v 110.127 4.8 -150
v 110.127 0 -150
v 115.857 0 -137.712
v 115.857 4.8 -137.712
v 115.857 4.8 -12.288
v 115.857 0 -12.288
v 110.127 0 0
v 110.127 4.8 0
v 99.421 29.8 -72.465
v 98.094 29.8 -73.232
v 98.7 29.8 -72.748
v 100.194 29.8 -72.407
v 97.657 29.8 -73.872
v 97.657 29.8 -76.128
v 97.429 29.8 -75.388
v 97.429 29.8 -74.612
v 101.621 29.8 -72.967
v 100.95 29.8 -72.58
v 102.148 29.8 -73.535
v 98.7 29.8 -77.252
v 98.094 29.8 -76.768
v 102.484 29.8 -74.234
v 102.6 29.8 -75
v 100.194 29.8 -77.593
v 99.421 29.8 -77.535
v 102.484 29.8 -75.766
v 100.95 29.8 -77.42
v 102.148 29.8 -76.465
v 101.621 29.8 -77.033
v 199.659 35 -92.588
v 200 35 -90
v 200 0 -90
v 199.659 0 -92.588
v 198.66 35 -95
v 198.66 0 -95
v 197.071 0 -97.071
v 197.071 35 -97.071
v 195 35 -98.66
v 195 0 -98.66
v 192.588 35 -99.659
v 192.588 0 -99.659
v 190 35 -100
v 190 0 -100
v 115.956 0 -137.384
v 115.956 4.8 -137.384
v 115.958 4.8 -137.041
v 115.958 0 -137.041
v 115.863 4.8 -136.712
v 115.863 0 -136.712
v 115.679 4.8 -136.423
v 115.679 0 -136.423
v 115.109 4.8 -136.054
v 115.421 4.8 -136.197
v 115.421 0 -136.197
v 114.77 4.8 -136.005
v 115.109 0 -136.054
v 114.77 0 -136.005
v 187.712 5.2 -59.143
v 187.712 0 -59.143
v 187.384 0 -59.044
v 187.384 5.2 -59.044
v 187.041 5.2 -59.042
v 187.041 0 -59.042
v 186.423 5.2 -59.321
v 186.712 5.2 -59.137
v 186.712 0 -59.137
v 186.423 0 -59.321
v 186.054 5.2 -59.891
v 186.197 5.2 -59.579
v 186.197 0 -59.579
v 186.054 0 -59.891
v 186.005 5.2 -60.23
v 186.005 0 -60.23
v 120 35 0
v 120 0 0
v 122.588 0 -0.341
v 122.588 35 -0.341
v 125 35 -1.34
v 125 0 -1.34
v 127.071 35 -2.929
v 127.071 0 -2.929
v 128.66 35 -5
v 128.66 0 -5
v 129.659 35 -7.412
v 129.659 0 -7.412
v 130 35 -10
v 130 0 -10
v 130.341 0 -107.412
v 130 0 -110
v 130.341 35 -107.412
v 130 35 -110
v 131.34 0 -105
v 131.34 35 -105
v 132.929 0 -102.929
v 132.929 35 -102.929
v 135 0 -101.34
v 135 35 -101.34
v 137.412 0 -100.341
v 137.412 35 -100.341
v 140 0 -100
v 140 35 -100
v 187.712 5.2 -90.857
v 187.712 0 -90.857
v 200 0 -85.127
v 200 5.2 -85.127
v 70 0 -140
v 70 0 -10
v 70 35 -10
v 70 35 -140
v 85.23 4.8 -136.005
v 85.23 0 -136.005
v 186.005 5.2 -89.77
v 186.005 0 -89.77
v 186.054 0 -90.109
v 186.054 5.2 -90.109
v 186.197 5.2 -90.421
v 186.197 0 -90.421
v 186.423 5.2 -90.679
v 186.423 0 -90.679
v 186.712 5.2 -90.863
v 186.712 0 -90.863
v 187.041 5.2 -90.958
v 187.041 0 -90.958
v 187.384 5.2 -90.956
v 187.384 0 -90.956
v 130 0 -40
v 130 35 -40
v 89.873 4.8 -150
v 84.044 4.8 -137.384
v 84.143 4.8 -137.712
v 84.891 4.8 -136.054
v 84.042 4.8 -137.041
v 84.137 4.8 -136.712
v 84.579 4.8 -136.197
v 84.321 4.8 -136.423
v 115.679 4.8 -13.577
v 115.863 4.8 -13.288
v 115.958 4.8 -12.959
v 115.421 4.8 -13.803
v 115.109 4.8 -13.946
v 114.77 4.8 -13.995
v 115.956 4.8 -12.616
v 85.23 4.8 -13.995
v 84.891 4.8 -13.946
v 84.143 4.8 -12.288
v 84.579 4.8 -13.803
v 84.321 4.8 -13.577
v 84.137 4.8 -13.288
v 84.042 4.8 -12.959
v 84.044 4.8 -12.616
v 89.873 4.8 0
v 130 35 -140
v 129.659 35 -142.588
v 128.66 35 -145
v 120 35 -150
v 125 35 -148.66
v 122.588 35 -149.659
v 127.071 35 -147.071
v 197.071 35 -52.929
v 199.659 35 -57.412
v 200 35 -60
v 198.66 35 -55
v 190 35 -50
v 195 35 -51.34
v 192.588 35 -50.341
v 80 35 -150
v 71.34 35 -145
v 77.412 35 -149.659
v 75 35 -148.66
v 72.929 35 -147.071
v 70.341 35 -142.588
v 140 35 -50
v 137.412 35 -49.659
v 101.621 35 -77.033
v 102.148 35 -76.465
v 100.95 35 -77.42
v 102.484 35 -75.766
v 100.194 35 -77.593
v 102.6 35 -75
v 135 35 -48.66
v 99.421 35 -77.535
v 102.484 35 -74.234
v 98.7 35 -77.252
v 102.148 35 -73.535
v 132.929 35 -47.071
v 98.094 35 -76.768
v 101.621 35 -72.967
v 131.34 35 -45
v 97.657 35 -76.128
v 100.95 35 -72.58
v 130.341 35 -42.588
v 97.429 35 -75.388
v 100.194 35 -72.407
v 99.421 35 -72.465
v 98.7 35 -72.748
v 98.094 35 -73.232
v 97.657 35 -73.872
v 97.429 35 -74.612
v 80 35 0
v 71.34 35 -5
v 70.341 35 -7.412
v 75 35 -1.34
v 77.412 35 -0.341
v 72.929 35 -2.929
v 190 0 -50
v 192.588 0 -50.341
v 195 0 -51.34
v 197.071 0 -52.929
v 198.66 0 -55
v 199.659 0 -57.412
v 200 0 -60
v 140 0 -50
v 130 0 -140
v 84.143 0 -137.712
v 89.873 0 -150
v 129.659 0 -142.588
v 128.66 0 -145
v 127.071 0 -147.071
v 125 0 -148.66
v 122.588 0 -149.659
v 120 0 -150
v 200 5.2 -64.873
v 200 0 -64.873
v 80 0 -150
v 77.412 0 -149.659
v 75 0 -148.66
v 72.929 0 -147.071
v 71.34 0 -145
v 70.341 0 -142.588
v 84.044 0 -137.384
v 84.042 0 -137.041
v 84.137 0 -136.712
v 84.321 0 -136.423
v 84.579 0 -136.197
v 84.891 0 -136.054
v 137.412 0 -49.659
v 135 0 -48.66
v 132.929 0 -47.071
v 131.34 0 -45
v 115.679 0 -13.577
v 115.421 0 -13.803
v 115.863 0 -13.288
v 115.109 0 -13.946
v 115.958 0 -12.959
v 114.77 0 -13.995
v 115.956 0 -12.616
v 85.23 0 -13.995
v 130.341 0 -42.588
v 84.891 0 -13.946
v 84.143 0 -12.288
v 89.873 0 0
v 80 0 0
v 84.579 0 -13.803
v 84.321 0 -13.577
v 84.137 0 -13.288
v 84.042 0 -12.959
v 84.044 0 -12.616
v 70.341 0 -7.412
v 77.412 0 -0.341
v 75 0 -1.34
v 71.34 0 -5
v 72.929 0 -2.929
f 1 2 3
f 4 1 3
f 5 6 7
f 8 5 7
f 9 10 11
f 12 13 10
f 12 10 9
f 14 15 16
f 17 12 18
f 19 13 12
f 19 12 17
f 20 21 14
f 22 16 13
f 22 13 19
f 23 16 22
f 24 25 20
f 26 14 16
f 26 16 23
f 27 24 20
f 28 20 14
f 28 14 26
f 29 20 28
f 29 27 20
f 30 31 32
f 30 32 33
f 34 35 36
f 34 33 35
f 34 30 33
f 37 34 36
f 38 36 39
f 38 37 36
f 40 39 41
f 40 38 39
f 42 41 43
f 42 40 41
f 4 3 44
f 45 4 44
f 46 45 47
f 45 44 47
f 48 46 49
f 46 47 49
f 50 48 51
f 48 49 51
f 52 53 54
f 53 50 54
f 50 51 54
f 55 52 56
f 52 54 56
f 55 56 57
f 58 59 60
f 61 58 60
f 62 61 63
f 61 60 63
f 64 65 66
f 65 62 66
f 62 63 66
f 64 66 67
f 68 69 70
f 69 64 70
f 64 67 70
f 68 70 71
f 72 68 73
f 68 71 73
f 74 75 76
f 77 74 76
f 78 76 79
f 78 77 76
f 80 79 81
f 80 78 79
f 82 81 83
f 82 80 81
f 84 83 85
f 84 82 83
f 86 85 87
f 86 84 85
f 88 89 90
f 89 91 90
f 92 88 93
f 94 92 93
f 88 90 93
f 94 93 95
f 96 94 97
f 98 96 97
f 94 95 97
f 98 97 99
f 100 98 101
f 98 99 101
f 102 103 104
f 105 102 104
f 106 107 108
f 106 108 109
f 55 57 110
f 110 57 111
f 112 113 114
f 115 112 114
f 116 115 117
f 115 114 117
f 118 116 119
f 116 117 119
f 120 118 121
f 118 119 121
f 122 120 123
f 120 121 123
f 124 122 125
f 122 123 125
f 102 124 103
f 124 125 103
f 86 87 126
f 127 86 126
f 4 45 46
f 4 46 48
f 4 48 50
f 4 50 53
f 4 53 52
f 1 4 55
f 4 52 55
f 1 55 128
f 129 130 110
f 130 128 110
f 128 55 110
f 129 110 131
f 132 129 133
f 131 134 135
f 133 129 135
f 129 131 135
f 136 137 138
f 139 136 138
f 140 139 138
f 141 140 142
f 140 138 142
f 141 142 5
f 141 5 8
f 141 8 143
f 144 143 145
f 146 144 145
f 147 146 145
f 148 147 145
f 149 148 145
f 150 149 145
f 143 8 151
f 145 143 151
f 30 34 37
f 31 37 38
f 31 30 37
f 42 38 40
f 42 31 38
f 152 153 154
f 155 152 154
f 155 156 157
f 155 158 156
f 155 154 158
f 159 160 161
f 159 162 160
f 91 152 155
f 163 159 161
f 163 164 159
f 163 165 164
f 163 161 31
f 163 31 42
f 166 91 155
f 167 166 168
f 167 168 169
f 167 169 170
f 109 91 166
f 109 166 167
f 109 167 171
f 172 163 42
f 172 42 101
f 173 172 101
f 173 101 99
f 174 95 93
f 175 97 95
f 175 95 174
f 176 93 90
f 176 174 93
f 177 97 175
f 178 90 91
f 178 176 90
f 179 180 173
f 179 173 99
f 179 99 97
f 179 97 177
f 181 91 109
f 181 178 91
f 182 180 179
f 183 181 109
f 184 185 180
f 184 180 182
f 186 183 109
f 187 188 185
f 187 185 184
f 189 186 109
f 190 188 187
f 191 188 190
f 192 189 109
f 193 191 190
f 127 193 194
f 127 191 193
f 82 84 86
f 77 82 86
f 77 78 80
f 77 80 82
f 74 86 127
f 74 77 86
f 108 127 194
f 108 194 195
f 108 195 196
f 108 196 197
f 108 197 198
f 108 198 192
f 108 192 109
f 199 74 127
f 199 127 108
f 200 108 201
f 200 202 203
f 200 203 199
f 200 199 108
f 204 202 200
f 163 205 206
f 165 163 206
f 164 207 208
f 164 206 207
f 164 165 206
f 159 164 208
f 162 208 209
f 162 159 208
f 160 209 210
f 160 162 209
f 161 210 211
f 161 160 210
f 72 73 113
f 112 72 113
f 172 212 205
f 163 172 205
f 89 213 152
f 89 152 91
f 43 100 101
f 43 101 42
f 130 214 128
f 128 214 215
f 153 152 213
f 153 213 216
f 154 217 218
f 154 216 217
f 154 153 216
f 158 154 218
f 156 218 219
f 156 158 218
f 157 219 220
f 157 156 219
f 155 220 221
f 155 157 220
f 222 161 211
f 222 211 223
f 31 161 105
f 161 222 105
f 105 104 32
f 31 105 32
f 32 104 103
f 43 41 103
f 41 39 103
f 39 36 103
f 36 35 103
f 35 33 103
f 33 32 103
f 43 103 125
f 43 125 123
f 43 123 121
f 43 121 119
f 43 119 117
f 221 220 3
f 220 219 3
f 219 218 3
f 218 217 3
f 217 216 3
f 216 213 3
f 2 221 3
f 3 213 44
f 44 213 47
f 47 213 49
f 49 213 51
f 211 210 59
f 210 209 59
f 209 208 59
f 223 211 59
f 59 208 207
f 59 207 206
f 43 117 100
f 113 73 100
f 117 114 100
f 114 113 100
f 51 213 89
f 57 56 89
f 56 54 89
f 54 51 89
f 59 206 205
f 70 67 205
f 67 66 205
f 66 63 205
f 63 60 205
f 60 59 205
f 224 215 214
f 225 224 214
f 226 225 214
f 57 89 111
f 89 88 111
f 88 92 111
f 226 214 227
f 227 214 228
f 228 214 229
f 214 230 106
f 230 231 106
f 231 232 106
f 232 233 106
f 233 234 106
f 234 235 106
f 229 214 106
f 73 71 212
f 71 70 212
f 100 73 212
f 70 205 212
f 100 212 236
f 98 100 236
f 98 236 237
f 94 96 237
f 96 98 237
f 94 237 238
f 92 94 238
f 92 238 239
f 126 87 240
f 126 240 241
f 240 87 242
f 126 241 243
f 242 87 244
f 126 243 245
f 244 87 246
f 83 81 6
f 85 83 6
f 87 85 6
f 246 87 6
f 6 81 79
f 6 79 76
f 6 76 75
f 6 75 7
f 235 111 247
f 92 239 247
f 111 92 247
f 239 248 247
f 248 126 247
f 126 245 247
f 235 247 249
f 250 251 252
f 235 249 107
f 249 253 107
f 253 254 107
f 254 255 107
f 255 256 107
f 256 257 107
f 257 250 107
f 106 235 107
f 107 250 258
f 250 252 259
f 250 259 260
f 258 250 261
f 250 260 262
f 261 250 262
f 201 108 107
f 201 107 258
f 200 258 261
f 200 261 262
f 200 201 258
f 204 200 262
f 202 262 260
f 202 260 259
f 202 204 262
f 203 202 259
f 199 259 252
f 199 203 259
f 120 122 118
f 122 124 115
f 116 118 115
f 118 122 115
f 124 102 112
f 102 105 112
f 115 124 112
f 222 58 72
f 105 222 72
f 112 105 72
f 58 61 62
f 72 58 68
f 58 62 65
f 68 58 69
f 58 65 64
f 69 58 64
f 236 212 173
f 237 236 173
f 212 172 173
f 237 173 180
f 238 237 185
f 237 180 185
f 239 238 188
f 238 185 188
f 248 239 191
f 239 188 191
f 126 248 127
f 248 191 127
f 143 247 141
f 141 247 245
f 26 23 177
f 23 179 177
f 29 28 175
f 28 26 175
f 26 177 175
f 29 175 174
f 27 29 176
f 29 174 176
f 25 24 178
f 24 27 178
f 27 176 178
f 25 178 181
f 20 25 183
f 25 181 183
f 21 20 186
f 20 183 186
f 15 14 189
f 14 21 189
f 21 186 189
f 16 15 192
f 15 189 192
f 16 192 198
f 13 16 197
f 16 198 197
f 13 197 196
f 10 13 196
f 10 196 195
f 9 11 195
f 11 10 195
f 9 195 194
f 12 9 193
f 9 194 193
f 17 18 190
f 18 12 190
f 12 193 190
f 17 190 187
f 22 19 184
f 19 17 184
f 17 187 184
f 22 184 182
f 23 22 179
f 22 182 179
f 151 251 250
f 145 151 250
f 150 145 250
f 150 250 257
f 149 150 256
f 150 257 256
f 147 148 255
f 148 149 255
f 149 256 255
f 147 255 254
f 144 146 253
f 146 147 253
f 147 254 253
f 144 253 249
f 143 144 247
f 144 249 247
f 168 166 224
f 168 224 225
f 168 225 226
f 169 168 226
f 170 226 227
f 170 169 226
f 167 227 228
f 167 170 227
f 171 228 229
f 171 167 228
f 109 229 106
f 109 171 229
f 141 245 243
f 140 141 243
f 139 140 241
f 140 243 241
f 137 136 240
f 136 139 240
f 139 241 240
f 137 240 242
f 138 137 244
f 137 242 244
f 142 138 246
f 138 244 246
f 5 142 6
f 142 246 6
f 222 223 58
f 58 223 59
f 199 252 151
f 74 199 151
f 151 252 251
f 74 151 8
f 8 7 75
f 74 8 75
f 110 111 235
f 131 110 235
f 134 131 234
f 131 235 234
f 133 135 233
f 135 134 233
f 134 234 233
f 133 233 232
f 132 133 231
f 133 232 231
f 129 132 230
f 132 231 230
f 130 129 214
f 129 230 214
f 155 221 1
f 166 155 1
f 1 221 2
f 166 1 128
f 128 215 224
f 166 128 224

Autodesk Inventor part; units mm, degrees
ref_plane "YZ Plane" through (0, 0, 0) normal (1, 0, 0) x (0, 1, 0)
ref_plane "XZ Plane" through (0, 0, 0) normal (0, 1, 0) x (-1, 0, 0)
ref_plane "XY Plane" through (0, 0, 0) normal (0, 0, 1) x (1, 0, 0)
sketch "Sketch1" plane through (0, 0, 0) normal (0, 1, 0) x (-1, 0, 0)
  line L0 (0, 0) -> (-200, 0)
  line L1 (-200, 0) -> (-200, -150)
  line L2 (-200, -150) -> (0, -150)
  line L3 (0, -150) -> (0, 0)
  line L4 (-109.8726, -150) -> (-90.1274, -150)
  line L5 (-200, -85.1274) -> (-200, -64.8726)
  line L6 (-186.0054, -60.2304) -> (-186.0054, -75)
  line L7 (-200, -64.8726) -> (-187.7125, -59.1428)
  arc A0 (-186.0054, -60.2304) -> (-187.7125, -59.1428) centre (-187.2054, -60.2304) ccw
  line L8 (-186.0054, -75) -> (-186.0054, -89.7696)
  line L9 (-199.8, -85) -> (-186.3697, -85) construction
  arc A1 (-187.7125, -90.8572) -> (-186.0054, -89.7696) centre (-187.2054, -89.7696) ccw
  line L10 (-187.7125, -90.8572) -> (-200, -85.1274)
  line L11 (-89.8726, -150) -> (-110.1274, -150)
  line L12 (-114.7696, -136.0054) -> (-100, -136.0054)
  line L13 (-110.1274, -150) -> (-115.8572, -137.7125)
  arc A2 (-114.7696, -136.0054) -> (-115.8572, -137.7125) centre (-114.7696, -137.2054) ccw
  line L14 (-100, -136.0054) -> (-85.2304, -136.0054)
  line L15 (-90, -149.8) -> (-90, -136.3697) construction
  arc A3 (-84.1428, -137.7125) -> (-85.2304, -136.0054) centre (-85.2304, -137.2054) ccw
  line L16 (-84.1428, -137.7125) -> (-89.8726, -150)
  line L17 (-90.1274, 0) -> (-109.8726, 0)
  line L18 (-85.2304, -13.9946) -> (-100, -13.9946)
  arc A4 (-115.8572, -12.2875) -> (-114.7696, -13.9946) centre (-114.7696, -12.7946) ccw
  arc A5 (-85.2304, -13.9946) -> (-84.1428, -12.2875) centre (-85.2304, -12.7946) ccw
  line L19 (-89.8726, 0) -> (-84.1428, -12.2875)
  line L20 (-110.1274, 0) -> (-89.8726, 0)
  line L21 (-110, -0.2) -> (-110, -13.6303) construction
  line L22 (-115.8572, -12.2875) -> (-110.1274, 0)
  line L23 (-100, -13.9946) -> (-114.7696, -13.9946)
  point P0 (-100, -150)
  point P1 (-100, -150)
  point P2 (-100, -150)
  point P3 (-100, -150)
  point P4 (-200, -75)
  point P5 (-186.2054, -91.3393)
  point P6 (-200, -75)
  point P7 (-200, -75)
  point P8 (-100, -150)
  point P9 (-83.6607, -136.2054)
  point P10 (-100, 0)
  point P11 (-116.3393, -13.7946)
  point P12 (-100, 0)
  point P13 (-100, 0)
  dimension "d0" = 200
  dimension "d1" = 150
  dimension "d2" = 15
  dimension "d13" = 15
  dimension "d14" = 15
extrude "Extrusion1" add sketch "Sketch1" along normal blind 35
extrude "Extrusion2" cut sketch "Sketch1" along normal blind 5.2 contours L7 A0 L6 L8 A1 L10 L1
sketch "Sketch2" plane through (0, 35, 0) normal (0, 1, 0) x (1, 0, 0)
  line L0 (0, 150) -> (0, 0) projected
  line L1 (0, 75) -> (100, 75)
  circle A0 centre (100, 75) radius 2.6
  dimension "d9" = 100
  dimension "d10" = 5.2
extrude "Extrusion4" cut sketch "Sketch2" against normal blind 5.2
extrude "Extrusion5" cut sketch "Sketch1" along normal blind 4.8 contours L19 A5 L18 L23 A4 L22 L0 | L2 L13 A2 L12 L14 A3 L16
sketch "Sketch3" plane through (0, 0, 0) normal (0, -1, 0) x (1, 0, 0)
  line L0 (200, -150) -> (0, -150) projected
  line L1 (0, 0) -> (70, 0)
  line L2 (70, 0) -> (70, -150)
  line L3 (70, -150) -> (0, -150)
  line L4 (0, -150) -> (0, 0)
  line L5 (200, 0) -> (200, -64.8726) projected
  line L6 (200, 0) -> (130, 0)
  line L7 (130, 0) -> (130, -50)
  line L8 (130, -50) -> (200, -50)
  line L9 (200, -50) -> (200, 0)
  line L10 (200, -150) -> (130, -150)
  line L11 (130, -150) -> (130, -100)
  line L12 (130, -100) -> (200, -100)
  line L13 (200, -100) -> (200, -150)
  dimension "d17" = 70
  dimension "d18" = 70
  dimension "d19" = 50
  dimension "d20" = 70
  dimension "d21" = 50
extrude "Extrusion6" cut sketch "Sketch3" against normal blind 40
fillet "Fillet1" radius 10 8 edges at (130, 17.5, -50) (200, 17.5, -50) (200, 17.5, -100) (130, 17.5, 0) (70, 17.5, 0) (70, 17.5, -150) (130, 17.5, -150) (130, 17.5, -100)
properties part number "Area mv"
